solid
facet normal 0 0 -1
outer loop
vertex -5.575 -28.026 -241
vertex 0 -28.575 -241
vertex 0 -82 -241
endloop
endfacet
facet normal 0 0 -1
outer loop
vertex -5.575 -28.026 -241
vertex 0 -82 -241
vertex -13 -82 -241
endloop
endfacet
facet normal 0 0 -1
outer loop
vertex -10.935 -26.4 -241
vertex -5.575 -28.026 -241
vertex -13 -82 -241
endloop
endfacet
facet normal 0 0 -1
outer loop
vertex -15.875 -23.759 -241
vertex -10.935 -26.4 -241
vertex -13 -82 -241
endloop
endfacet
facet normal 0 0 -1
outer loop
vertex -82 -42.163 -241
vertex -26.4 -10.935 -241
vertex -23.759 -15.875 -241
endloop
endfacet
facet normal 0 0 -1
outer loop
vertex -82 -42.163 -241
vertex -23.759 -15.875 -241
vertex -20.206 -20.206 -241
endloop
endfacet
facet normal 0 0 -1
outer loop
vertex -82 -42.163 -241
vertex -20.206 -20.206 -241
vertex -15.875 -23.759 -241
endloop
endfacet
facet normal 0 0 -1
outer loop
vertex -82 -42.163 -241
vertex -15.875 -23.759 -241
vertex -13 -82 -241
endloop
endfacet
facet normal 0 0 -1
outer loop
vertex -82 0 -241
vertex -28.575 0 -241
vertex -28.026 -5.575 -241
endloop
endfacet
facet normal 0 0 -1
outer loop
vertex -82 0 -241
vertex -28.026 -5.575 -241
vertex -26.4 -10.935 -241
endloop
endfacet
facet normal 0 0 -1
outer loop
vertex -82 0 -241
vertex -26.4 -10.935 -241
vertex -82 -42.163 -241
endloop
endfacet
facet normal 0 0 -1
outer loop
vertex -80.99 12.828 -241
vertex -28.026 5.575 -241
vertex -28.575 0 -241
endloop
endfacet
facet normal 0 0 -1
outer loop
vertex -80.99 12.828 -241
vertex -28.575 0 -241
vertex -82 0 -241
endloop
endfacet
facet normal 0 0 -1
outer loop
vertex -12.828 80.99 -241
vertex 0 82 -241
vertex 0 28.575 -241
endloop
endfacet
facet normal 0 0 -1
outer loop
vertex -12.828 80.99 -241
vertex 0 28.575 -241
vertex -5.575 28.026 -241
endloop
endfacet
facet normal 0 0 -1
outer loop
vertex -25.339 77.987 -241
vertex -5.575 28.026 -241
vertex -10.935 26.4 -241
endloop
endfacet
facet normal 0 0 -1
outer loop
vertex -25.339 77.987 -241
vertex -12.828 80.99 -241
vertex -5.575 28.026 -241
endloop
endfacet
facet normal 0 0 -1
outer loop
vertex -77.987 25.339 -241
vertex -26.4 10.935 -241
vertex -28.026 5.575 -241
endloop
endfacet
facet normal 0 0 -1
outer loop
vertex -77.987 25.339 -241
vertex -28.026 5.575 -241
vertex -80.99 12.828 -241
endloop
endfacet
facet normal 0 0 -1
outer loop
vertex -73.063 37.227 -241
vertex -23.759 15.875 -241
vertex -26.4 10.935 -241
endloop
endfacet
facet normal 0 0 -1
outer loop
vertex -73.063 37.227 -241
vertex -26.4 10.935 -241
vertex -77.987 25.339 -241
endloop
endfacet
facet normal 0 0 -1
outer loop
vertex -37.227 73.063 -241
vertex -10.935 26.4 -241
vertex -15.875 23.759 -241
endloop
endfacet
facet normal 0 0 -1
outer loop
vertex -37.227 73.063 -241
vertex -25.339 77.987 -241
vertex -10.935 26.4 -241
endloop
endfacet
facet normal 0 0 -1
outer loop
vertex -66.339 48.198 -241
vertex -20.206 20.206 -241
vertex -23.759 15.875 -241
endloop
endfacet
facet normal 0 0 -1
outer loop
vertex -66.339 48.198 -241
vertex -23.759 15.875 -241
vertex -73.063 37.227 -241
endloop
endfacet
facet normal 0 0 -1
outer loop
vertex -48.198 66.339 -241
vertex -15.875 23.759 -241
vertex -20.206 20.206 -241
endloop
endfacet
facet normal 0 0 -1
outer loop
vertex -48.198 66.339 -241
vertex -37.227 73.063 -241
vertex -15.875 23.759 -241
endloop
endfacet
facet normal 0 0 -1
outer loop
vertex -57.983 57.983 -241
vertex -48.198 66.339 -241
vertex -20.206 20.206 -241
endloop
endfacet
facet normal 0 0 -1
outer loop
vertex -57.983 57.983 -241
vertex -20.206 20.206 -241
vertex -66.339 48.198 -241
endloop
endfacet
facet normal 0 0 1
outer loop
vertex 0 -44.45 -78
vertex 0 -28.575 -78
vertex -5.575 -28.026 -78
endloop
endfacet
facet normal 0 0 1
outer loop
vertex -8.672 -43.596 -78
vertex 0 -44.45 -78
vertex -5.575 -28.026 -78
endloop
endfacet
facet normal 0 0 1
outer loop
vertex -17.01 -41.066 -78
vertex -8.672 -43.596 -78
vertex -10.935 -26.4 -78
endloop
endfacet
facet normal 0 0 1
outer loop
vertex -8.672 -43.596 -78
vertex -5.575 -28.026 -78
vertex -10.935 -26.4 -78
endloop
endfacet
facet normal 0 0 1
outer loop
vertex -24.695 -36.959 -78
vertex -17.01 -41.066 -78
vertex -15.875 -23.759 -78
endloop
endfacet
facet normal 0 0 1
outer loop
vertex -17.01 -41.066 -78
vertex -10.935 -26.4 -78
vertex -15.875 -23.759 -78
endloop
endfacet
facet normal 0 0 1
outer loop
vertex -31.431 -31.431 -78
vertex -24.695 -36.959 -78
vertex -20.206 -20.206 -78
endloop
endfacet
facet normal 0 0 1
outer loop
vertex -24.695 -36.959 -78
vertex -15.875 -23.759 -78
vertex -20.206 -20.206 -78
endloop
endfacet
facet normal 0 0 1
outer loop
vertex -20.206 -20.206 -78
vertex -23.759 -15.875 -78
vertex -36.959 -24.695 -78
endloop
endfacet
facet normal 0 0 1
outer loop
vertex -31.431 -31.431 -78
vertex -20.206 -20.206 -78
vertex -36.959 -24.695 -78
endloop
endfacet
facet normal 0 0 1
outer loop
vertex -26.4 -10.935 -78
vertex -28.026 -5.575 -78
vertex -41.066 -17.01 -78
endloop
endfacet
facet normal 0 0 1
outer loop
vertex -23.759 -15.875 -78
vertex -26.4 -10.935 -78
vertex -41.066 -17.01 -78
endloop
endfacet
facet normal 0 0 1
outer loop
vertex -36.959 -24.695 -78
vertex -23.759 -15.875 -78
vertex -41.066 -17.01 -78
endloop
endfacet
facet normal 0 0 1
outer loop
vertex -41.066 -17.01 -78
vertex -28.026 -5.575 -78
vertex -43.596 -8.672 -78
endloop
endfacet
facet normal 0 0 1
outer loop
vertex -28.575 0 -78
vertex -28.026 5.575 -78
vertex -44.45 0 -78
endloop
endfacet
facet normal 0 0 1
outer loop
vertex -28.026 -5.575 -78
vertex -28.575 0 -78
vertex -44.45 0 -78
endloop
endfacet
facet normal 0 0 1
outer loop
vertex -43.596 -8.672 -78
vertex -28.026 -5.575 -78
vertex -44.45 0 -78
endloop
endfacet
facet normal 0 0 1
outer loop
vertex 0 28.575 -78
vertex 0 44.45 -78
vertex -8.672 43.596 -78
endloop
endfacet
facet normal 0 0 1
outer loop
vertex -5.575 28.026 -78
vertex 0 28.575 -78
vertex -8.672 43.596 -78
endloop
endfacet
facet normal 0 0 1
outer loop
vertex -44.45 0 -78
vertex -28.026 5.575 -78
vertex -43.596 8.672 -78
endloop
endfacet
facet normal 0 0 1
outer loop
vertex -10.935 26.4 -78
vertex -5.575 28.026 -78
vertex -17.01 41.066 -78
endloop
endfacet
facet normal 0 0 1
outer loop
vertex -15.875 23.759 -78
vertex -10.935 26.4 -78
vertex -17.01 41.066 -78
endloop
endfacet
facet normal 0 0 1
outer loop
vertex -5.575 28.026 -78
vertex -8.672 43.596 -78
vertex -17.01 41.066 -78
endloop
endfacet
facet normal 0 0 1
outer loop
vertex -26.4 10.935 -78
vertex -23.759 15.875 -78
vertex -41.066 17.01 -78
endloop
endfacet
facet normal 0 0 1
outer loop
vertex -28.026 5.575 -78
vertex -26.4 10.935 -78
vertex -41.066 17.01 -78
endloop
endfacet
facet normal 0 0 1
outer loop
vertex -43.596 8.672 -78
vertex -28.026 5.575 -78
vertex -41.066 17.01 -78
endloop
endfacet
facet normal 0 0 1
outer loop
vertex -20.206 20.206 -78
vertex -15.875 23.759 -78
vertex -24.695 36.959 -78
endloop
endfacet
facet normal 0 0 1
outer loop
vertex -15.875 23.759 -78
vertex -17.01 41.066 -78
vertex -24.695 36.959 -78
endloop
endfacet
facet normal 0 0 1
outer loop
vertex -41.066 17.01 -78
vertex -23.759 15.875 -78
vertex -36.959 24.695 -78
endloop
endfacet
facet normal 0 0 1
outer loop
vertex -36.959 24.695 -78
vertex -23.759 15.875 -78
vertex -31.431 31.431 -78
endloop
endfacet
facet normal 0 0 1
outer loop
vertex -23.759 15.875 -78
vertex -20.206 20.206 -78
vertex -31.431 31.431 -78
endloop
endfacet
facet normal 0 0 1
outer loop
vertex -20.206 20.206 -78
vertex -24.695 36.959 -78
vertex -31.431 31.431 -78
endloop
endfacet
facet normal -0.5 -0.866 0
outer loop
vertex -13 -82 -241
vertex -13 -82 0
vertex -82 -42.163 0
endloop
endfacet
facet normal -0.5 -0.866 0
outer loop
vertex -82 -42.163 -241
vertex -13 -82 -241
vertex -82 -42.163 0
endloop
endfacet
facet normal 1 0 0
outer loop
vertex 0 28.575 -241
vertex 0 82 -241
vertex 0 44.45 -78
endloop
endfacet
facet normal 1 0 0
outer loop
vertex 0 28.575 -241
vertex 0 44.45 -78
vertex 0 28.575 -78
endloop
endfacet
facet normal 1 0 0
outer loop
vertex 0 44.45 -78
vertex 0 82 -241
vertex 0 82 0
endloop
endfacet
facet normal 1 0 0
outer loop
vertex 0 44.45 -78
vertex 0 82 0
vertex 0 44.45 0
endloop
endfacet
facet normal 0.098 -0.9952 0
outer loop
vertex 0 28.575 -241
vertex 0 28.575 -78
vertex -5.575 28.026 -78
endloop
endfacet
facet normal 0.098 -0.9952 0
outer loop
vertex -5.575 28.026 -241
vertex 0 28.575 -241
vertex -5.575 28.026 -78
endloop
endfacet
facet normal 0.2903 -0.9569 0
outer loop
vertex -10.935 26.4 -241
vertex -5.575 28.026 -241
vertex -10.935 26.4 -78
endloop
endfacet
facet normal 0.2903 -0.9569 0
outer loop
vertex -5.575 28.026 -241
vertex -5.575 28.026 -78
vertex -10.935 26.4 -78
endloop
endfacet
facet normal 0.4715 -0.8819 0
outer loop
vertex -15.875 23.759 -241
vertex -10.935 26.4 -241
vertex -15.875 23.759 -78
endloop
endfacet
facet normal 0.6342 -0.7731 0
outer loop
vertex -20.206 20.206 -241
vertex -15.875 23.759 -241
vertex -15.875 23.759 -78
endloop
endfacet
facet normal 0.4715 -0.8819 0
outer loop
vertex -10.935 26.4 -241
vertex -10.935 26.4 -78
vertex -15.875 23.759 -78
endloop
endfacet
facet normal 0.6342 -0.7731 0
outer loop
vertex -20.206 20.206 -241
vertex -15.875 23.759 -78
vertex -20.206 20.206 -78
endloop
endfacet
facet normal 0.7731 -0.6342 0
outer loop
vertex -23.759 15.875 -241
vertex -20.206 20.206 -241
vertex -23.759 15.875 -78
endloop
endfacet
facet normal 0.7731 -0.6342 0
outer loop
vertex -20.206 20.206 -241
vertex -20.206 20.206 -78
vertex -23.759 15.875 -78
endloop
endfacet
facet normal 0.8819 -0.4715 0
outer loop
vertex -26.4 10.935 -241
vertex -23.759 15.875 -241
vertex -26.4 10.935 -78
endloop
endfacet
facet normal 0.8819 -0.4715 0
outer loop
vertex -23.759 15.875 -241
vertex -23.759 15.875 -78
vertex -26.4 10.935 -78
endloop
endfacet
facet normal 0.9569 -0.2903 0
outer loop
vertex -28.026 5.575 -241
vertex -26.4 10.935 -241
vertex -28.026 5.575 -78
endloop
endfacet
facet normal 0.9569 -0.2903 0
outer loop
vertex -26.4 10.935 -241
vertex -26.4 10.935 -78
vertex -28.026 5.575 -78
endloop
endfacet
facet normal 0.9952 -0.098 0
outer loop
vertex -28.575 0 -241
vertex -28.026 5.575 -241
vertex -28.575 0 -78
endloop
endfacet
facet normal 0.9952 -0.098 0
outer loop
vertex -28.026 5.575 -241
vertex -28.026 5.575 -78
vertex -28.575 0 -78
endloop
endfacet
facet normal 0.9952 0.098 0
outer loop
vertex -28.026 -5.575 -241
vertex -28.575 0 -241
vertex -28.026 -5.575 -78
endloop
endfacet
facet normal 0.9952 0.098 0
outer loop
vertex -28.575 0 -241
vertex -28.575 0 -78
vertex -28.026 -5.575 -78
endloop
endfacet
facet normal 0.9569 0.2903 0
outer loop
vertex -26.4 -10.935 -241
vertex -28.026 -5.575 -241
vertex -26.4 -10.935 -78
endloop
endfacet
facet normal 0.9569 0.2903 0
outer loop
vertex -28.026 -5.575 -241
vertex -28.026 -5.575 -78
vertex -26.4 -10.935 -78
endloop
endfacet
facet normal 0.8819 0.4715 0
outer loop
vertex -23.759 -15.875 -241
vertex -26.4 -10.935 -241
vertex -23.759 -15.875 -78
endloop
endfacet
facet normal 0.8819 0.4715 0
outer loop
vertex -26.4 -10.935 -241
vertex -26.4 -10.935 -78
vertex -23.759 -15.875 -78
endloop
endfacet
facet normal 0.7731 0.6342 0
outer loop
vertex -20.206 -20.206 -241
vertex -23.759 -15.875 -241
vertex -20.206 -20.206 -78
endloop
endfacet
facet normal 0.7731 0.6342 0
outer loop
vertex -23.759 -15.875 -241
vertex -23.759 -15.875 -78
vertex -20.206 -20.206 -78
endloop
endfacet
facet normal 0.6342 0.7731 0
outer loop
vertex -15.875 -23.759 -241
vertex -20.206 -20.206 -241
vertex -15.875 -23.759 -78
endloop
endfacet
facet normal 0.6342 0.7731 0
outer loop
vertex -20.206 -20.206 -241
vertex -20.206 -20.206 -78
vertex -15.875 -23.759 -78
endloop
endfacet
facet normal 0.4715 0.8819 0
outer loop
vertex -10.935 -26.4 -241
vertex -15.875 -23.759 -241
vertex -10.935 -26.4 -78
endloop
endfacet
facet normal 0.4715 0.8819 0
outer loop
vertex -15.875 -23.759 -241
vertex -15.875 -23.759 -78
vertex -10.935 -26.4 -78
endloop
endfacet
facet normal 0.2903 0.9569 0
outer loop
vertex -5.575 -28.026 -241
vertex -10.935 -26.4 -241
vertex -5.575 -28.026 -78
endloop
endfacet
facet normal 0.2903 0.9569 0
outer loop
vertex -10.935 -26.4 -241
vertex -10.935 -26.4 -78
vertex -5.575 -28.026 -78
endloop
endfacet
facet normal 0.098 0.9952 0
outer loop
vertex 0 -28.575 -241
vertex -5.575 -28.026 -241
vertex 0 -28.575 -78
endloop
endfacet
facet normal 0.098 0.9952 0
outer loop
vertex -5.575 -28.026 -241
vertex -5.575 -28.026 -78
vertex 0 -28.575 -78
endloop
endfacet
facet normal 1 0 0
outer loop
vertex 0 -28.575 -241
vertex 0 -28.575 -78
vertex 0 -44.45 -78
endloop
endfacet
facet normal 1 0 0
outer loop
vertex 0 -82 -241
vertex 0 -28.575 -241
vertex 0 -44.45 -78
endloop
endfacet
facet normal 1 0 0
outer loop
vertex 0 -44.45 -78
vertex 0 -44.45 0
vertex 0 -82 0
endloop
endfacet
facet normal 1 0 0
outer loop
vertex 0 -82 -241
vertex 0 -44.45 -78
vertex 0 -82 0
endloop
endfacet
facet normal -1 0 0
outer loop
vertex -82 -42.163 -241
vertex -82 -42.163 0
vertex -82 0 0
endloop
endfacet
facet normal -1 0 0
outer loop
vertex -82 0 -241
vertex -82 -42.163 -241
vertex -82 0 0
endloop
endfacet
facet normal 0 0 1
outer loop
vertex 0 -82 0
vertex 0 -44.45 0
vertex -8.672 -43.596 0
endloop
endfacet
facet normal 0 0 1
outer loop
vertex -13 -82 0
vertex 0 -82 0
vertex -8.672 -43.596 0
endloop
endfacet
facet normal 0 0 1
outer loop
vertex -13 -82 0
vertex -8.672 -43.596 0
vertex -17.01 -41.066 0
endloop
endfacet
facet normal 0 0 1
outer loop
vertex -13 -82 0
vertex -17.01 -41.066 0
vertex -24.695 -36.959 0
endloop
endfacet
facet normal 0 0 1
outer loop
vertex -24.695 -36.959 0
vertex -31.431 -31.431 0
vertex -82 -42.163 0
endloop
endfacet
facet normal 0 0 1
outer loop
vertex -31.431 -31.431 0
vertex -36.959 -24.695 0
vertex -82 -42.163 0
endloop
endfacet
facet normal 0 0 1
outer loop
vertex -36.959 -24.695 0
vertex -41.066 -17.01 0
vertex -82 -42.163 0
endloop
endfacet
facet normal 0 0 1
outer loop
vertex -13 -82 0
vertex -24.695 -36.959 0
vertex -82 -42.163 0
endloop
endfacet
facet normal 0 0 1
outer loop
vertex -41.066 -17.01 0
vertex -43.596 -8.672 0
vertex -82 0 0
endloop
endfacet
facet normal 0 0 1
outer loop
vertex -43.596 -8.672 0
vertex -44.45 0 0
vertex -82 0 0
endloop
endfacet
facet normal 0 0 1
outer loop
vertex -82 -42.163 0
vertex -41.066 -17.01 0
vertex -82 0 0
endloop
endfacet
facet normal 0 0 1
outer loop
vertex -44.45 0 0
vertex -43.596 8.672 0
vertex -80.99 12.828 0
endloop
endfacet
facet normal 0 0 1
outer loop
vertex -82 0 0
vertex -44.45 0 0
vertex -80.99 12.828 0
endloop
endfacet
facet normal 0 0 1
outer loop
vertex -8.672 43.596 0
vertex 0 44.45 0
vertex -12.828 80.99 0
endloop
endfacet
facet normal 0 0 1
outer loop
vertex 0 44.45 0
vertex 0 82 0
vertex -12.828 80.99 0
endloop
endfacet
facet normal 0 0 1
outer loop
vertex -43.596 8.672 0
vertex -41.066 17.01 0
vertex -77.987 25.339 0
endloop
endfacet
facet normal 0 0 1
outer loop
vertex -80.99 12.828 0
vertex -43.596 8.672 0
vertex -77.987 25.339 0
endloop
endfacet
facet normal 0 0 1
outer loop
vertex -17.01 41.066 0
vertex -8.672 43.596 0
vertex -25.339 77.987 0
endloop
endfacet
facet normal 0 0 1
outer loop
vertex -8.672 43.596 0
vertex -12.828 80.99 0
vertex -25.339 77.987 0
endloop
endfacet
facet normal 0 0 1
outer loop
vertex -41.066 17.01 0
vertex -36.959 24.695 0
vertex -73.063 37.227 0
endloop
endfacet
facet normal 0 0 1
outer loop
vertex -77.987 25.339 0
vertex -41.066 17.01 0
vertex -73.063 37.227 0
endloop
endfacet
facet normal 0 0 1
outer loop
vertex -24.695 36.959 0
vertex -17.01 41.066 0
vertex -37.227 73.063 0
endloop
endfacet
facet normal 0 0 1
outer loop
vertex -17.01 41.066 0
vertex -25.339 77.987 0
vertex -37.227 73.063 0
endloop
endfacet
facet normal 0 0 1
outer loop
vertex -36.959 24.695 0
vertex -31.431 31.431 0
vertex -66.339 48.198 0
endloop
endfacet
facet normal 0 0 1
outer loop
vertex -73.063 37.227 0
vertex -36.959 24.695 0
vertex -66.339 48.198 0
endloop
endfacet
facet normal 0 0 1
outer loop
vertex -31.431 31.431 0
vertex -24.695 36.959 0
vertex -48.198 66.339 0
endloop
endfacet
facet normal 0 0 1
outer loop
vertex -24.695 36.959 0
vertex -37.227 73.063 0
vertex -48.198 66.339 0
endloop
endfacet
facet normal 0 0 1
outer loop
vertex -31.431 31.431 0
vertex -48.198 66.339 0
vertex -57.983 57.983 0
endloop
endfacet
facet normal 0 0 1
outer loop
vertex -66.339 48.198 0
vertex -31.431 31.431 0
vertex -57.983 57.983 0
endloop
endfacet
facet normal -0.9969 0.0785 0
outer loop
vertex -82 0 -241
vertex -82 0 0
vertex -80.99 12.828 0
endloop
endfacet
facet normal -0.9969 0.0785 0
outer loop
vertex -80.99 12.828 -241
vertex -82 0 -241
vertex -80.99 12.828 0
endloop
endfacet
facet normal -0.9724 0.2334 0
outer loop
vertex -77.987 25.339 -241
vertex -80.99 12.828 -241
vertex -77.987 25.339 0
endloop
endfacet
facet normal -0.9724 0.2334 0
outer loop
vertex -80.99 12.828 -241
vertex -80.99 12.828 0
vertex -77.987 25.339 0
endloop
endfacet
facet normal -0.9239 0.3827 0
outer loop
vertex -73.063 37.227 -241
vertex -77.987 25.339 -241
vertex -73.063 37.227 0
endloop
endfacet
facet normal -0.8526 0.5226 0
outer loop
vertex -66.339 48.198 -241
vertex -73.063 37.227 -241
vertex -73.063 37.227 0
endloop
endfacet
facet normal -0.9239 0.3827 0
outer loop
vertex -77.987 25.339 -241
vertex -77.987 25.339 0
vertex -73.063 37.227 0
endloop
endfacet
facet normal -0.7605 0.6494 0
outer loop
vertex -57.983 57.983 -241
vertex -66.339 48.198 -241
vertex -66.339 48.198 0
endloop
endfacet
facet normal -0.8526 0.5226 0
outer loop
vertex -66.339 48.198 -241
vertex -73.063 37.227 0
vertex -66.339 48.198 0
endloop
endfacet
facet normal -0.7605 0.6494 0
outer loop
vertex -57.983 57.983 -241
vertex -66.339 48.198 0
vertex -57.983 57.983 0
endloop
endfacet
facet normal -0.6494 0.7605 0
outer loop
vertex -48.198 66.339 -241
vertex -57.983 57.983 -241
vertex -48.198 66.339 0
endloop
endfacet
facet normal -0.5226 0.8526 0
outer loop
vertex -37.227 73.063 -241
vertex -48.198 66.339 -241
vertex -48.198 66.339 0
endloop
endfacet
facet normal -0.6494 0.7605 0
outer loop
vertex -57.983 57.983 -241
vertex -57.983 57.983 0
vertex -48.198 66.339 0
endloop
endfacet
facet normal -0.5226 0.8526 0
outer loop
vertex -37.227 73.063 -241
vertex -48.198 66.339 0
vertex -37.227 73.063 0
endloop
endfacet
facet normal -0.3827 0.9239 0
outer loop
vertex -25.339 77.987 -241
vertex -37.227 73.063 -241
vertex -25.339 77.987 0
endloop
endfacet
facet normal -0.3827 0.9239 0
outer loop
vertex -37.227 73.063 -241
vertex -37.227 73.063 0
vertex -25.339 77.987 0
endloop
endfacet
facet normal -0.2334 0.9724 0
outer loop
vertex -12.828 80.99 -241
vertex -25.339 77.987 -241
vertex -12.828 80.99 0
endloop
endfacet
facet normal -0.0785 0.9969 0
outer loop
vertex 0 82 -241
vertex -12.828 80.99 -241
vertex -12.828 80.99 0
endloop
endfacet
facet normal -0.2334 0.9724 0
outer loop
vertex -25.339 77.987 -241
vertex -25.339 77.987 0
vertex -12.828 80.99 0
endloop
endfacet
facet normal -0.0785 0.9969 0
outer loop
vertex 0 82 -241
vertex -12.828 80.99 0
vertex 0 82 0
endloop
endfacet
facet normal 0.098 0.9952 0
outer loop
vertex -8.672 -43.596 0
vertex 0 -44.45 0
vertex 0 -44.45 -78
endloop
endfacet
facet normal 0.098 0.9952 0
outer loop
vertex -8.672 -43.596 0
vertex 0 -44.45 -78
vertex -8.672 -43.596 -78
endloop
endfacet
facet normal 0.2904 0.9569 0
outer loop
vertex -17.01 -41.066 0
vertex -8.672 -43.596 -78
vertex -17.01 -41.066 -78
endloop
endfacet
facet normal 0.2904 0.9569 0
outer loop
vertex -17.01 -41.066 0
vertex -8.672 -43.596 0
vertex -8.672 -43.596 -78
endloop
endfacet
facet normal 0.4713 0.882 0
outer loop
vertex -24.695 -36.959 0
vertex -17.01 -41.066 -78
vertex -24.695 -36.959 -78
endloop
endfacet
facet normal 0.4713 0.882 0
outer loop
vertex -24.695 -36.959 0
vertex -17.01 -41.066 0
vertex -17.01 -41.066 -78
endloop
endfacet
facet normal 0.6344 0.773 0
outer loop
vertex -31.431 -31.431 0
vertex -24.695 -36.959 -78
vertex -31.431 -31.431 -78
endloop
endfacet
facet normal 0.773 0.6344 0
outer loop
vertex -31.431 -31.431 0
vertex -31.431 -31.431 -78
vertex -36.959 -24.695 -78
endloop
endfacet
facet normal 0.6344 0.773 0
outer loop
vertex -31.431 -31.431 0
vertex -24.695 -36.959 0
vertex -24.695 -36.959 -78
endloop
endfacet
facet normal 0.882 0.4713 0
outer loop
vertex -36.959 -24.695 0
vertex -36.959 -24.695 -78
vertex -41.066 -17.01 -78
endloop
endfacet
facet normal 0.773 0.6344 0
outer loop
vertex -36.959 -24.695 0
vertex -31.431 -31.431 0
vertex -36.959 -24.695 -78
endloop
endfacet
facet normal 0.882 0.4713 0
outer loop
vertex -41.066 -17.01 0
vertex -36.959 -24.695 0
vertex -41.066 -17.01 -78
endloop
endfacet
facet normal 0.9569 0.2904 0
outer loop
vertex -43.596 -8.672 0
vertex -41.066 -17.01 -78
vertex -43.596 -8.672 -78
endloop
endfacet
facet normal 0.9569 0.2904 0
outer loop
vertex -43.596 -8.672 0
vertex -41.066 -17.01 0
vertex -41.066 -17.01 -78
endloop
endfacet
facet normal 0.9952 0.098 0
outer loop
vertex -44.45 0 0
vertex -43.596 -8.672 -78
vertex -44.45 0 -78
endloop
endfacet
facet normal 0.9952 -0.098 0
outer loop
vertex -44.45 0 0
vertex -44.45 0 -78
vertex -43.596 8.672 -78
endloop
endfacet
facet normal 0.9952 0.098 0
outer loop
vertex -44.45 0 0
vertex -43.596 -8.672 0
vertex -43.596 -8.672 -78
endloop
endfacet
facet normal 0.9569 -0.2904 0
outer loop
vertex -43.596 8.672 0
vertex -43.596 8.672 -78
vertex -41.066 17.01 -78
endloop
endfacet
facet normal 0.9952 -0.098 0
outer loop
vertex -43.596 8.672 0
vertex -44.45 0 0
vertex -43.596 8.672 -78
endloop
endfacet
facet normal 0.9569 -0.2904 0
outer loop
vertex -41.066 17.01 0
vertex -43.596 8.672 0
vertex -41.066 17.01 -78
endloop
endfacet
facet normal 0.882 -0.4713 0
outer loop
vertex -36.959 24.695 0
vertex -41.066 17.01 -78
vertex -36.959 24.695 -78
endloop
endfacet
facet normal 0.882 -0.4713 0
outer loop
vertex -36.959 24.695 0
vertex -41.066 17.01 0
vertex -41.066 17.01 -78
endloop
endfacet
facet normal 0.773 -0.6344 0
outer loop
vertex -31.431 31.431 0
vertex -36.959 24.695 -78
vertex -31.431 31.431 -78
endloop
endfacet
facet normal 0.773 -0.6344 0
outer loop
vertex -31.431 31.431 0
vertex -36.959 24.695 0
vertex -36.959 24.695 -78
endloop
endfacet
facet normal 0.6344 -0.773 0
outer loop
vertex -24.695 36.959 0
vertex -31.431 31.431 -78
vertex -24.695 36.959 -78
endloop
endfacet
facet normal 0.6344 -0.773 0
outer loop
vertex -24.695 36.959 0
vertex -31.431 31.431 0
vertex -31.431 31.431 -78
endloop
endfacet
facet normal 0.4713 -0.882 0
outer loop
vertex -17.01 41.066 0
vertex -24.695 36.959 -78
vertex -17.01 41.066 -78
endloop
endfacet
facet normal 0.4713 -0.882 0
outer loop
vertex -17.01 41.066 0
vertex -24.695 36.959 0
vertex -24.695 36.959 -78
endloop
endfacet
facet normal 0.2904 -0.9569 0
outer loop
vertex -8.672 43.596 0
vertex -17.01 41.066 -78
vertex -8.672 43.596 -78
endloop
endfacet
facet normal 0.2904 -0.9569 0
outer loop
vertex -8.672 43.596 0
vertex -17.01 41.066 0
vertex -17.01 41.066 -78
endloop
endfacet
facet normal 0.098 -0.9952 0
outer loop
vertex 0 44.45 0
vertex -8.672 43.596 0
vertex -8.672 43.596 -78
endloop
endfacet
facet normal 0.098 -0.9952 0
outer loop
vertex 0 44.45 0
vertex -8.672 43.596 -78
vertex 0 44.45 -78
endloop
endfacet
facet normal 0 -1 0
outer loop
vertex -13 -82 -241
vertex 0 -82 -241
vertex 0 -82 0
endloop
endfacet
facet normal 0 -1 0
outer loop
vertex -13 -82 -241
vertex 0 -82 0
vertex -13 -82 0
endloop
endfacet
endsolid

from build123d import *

# Parameters (mm, degrees)
BOSS_EXTRUDE1_DEPTH = 241
CUT_EXTRUDE1_DEPTH  = 78


with BuildPart() as part:
    # Sketch2 → Boss-Extrude1 (new body)
    with BuildSketch(Plane.XY):
        with BuildLine():
            Line((0, -28.575), (0, -82))
            Line((0, -82), (-13, -82))
            Line((-13, -82), (-82, -42.162831426))
            Line((-82, -42.162831426), (-82, 0))
            ThreePointArc((-82, 0), (-57.982756057, 57.982756057), (0, 82))
            Line((0, 82), (0, 28.575))
            ThreePointArc((0, 28.575), (-28.575, 0), (0, -28.575))
        make_face()
    extrude(amount=-BOSS_EXTRUDE1_DEPTH)

    # Sketch3 → Cut-Extrude1 (cut)
    with BuildSketch(Plane.XY):
        with BuildLine():
            Line((0, 44.45), (0, 28.575))
            ThreePointArc((0, 28.575), (-28.575, 0), (0, -28.575))
            Line((0, -28.575), (0, -44.45))
            ThreePointArc((0, -44.45), (-44.45, 0), (0, 44.45))
        make_face()
    extrude(amount=-CUT_EXTRUDE1_DEPTH, mode=Mode.SUBTRACT)


solid = part.part
